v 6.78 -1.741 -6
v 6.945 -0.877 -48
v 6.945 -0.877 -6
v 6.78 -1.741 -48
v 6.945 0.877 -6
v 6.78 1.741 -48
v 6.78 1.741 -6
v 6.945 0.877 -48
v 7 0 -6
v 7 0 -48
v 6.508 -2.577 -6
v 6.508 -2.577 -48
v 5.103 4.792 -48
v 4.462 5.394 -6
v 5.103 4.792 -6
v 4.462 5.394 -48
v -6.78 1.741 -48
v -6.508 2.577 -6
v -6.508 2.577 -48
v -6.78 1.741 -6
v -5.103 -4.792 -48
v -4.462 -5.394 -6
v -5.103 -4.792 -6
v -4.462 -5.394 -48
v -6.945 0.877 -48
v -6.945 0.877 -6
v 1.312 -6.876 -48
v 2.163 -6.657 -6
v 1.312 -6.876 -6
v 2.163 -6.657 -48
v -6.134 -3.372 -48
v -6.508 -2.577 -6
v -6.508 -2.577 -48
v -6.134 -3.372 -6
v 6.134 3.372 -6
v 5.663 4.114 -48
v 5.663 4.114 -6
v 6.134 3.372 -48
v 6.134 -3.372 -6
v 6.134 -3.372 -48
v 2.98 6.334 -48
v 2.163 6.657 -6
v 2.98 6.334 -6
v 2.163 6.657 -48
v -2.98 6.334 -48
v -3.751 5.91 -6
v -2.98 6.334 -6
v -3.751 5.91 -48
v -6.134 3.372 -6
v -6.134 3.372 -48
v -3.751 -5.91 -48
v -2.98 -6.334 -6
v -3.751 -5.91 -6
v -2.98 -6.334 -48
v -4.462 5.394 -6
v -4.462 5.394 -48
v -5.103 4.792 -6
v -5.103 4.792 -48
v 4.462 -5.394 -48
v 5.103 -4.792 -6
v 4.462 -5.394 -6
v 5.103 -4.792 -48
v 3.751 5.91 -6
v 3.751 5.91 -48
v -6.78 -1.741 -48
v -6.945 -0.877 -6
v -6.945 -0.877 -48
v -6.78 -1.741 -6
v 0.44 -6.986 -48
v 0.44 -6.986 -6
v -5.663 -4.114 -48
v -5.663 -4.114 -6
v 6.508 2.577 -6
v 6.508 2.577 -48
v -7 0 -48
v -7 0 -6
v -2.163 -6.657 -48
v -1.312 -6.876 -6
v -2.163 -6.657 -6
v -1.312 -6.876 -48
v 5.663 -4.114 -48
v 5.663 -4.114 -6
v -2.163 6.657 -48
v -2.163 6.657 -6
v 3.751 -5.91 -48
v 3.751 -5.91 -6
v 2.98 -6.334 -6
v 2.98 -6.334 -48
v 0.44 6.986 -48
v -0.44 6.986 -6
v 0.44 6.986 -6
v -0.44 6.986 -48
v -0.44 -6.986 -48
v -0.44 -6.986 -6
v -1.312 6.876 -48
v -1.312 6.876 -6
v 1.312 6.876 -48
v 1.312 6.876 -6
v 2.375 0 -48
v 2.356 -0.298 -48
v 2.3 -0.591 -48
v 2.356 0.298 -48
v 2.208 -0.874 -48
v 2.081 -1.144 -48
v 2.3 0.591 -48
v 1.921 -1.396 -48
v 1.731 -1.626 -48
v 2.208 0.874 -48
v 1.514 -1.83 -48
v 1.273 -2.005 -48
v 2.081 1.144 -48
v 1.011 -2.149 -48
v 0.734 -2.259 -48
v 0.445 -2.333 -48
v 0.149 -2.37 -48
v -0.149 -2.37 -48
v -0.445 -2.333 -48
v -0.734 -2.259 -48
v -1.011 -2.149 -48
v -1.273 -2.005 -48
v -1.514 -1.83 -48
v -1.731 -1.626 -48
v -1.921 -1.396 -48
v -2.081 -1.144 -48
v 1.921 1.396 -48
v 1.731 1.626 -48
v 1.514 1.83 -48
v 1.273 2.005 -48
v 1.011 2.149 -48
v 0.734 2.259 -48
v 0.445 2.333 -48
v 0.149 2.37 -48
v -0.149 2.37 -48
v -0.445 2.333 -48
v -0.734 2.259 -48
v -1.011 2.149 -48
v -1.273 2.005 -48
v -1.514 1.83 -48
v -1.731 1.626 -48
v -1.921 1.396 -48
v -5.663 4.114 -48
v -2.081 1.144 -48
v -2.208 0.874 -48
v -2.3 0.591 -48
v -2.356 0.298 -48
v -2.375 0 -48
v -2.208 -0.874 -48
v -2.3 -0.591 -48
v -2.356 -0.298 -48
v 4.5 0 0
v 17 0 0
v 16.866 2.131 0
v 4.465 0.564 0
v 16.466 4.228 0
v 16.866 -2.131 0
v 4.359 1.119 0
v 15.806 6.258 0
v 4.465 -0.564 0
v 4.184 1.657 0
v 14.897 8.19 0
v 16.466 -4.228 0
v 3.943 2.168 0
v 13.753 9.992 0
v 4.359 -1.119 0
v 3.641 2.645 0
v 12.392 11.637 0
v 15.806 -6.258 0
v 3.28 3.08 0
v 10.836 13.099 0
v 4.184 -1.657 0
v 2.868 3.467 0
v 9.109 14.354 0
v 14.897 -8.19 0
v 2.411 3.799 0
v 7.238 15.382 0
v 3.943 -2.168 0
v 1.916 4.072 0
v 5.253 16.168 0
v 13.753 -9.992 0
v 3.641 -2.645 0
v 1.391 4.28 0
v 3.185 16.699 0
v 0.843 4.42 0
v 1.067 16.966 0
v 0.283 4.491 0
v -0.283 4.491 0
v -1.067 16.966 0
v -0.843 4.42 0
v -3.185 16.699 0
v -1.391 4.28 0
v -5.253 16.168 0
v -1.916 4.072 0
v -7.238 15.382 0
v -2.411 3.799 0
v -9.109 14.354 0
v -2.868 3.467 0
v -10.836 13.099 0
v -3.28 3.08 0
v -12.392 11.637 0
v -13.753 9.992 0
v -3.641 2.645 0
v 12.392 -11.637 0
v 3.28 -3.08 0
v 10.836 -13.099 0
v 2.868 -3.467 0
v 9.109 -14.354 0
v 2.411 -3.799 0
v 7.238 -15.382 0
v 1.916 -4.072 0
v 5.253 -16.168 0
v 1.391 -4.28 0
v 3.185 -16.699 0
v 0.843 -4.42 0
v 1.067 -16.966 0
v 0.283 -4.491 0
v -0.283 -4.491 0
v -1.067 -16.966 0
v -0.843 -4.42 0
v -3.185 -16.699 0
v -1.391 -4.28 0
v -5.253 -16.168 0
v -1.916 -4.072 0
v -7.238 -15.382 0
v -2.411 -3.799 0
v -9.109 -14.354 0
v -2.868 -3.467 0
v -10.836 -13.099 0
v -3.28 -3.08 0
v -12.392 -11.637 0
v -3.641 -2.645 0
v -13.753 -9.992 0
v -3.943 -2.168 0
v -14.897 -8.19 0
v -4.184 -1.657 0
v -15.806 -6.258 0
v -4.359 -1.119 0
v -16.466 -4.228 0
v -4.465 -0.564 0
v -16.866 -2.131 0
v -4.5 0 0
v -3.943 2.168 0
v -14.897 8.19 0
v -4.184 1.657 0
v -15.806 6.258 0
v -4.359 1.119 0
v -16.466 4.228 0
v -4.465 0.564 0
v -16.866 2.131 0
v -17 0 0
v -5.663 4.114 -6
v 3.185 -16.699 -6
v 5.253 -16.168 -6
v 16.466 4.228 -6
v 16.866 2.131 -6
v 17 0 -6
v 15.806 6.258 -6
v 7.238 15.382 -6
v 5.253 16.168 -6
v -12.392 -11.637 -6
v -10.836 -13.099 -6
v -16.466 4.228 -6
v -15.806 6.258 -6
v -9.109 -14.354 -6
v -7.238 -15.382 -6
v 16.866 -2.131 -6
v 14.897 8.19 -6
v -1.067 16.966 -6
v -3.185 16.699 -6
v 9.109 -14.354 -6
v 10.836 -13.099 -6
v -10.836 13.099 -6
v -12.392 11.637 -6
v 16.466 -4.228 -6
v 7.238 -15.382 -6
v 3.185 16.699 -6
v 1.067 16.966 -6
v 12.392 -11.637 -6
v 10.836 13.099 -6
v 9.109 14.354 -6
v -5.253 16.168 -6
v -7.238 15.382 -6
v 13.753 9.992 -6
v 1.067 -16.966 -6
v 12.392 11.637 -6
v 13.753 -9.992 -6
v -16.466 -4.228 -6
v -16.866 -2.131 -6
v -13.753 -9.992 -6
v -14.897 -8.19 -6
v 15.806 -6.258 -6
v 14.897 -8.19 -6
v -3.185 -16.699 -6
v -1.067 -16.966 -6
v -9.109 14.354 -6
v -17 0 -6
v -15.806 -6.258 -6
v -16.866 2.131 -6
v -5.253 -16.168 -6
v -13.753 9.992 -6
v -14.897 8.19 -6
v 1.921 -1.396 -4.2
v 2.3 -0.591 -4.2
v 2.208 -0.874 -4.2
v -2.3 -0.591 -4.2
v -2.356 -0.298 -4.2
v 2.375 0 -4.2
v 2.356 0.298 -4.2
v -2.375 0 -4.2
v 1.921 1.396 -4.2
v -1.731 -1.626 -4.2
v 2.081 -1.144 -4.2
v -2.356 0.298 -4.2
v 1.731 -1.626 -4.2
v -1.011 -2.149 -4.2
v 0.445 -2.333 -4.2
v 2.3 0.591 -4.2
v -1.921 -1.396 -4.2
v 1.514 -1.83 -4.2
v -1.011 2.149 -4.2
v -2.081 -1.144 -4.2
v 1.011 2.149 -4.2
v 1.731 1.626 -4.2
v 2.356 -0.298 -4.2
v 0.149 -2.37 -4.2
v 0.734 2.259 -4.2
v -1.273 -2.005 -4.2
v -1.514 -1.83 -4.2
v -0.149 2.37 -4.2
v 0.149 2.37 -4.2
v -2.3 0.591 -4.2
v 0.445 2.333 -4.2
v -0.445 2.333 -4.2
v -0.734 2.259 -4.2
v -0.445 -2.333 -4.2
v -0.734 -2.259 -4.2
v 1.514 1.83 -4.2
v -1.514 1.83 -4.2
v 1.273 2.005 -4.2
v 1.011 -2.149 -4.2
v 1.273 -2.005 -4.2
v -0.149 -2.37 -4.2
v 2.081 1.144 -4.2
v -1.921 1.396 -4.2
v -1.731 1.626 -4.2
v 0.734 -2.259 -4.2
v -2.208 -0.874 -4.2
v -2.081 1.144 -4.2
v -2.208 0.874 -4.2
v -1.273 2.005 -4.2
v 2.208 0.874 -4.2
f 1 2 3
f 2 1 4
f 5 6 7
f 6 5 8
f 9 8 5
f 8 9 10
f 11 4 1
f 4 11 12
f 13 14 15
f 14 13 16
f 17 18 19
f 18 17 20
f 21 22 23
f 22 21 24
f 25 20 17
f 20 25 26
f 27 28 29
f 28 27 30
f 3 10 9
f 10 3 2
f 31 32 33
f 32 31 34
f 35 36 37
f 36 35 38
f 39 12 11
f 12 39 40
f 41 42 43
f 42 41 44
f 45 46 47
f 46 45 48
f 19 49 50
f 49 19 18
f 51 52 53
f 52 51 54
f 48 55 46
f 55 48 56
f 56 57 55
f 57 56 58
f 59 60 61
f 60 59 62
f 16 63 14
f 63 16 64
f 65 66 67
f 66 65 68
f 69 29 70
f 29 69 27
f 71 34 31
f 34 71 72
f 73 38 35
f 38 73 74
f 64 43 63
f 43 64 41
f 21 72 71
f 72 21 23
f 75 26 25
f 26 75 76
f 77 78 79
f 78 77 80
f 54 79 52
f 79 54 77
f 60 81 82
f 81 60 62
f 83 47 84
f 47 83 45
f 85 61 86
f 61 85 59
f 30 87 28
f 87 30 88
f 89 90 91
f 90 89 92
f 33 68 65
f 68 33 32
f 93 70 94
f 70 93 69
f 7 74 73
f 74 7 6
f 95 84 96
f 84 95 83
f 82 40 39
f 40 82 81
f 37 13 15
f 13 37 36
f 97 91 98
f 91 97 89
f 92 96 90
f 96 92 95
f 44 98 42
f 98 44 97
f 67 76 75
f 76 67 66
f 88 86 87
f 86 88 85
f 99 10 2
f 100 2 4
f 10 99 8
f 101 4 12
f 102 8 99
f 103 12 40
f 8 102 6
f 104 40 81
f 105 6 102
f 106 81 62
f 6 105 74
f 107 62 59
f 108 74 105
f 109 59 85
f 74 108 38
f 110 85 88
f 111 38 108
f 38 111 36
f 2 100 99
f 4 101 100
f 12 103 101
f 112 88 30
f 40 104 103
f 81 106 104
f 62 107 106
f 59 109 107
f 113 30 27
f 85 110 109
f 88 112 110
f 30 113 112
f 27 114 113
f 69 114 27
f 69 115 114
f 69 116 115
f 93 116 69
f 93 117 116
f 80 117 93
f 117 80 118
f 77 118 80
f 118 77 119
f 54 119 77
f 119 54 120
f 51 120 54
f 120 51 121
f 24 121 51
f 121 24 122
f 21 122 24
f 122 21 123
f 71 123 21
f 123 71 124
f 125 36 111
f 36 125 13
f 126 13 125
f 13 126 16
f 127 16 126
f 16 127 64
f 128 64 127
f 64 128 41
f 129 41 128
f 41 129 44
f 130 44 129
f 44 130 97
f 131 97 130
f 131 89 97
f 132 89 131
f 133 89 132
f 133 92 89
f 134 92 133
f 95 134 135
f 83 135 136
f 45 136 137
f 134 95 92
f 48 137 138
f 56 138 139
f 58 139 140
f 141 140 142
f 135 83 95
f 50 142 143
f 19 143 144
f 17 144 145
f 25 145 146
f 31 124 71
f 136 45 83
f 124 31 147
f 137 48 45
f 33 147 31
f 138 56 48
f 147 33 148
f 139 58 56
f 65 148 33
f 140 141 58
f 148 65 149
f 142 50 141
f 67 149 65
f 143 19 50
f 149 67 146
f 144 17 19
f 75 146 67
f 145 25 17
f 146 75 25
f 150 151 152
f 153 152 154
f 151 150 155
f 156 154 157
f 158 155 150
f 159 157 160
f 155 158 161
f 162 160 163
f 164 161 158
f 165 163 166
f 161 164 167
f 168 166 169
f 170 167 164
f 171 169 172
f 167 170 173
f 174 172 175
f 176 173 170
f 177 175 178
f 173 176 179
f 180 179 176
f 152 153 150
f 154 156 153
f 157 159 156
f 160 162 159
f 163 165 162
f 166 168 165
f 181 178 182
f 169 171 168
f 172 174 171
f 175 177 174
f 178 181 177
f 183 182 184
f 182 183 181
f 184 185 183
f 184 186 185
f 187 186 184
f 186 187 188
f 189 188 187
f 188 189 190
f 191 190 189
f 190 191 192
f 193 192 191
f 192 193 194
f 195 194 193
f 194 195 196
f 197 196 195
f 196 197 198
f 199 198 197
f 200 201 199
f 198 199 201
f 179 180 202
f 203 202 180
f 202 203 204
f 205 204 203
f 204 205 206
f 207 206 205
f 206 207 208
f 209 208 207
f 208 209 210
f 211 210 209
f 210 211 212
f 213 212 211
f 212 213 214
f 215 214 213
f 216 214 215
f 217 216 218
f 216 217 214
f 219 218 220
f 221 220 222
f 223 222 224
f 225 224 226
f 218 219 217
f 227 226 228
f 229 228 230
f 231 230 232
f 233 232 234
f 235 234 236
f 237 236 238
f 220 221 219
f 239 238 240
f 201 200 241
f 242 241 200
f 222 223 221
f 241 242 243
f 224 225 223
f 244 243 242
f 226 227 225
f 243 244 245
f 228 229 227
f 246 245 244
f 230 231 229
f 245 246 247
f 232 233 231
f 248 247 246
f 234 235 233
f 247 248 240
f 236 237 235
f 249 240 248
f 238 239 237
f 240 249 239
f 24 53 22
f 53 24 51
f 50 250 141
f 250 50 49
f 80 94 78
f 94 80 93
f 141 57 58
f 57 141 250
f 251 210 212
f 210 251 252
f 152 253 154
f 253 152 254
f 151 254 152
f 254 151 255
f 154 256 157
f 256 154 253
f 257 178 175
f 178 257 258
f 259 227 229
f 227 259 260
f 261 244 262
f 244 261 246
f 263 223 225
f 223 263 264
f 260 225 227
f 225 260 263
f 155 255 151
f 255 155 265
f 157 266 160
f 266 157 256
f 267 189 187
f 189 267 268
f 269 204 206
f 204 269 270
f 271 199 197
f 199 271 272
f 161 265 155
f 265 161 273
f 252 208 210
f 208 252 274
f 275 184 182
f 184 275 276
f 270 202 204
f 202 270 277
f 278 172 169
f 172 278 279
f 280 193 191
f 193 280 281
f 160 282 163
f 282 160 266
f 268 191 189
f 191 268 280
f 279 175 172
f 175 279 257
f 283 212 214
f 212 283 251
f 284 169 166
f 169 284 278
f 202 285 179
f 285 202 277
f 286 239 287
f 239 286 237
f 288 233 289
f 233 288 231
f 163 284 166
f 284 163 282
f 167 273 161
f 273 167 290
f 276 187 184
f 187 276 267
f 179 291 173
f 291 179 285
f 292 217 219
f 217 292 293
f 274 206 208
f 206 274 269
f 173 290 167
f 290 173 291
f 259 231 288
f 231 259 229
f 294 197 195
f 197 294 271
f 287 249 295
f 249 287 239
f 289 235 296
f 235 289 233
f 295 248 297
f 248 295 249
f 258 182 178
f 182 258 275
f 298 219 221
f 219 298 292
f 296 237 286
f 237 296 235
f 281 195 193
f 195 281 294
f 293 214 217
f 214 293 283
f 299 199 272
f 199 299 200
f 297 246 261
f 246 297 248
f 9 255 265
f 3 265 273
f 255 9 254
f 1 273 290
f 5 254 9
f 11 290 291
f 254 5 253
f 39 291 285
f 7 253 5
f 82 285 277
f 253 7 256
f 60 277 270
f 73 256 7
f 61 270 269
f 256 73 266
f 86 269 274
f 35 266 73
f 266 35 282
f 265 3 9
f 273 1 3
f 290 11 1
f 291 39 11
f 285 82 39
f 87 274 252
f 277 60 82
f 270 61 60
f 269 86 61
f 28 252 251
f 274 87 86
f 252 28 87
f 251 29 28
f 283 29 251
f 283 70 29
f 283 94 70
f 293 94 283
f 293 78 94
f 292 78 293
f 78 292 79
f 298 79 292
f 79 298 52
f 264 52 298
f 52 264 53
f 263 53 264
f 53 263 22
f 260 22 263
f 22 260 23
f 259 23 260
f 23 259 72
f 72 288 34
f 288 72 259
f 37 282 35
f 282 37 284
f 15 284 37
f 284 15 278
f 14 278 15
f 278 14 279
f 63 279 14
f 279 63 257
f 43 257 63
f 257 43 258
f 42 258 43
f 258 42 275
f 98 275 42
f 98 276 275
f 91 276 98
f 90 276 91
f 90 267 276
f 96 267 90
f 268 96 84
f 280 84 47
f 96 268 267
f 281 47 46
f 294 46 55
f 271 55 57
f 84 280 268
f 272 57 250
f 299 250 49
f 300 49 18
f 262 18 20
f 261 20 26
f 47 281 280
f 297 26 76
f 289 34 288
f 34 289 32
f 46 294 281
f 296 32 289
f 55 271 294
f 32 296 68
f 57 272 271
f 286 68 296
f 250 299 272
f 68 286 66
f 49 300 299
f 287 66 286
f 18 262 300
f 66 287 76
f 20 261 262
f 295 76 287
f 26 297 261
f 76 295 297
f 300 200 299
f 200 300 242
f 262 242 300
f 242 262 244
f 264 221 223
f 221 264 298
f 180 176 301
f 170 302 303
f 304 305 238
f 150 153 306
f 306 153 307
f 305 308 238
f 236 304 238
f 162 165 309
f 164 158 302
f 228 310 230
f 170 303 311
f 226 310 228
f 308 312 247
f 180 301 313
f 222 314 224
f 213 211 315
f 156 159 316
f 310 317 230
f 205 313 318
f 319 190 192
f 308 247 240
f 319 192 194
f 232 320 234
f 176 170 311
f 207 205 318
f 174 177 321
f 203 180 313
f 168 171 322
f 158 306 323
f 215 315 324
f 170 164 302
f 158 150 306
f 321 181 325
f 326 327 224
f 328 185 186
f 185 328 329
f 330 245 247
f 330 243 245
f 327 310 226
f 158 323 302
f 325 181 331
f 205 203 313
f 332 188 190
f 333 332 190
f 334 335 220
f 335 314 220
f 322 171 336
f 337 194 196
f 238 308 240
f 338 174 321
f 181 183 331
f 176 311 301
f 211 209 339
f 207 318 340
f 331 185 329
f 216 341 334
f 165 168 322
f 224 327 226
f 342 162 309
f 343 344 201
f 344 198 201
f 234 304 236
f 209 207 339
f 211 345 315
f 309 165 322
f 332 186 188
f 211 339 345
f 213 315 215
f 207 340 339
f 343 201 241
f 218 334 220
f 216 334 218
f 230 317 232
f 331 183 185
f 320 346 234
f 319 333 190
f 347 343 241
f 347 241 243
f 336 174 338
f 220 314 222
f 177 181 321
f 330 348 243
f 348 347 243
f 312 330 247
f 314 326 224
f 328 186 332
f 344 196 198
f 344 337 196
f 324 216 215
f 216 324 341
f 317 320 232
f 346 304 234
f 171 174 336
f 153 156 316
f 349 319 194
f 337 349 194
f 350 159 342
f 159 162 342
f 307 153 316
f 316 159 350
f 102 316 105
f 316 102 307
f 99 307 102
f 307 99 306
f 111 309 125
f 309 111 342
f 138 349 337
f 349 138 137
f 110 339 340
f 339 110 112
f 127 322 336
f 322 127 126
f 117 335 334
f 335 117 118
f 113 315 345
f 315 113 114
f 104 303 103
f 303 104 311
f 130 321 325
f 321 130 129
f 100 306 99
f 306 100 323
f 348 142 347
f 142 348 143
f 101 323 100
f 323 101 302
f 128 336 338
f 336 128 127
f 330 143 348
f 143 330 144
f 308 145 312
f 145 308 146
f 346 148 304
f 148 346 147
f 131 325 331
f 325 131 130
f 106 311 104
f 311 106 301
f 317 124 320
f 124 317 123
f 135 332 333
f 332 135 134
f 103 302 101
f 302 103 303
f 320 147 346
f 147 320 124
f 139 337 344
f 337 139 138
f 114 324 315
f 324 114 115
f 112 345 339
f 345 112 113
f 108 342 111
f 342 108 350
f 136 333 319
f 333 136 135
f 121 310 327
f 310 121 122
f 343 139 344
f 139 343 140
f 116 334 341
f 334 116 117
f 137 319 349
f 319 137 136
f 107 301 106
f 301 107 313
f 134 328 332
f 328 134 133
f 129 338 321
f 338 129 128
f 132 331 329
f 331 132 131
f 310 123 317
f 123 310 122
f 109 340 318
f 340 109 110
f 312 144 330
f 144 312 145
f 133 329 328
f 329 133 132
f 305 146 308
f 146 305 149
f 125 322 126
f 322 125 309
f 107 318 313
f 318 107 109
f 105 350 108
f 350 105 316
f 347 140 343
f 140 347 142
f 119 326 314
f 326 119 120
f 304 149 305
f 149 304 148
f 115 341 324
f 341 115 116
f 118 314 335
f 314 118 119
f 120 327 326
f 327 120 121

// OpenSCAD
$fn = 50;


difference() {
	union() {
		translate(v = [0, 0, -48.0000000000]) {
			cylinder(h = 48, r = 7.0000000000);
		}
		translate(v = [0, 0, -6.0000000000]) {
			cylinder(h = 6, r = 17.0000000000);
		}
	}
	union() {
		translate(v = [0, 0, 0]) {
			rotate(a = [0, 0, 0]) {
				difference() {
					union() {
						#translate(v = [0, 0, -48.0000000000]) {
							cylinder(h = 48, r = 2.2500000000);
						}
						#translate(v = [0, 0, -4.2000000000]) {
							cylinder(h = 4.2000000000, r = 7.0000000000, r1 = 2.3750000000, r2 = 4.5000000000);
						}
						#translate(v = [0, 0, -48.0000000000]) {
							cylinder(h = 48, r = 2.3750000000);
						}
						#translate(v = [0, 0, -48.0000000000]) {
							cylinder(h = 48, r = 2.2500000000);
						}
					}
					union();
				}
			}
		}
	}
}
